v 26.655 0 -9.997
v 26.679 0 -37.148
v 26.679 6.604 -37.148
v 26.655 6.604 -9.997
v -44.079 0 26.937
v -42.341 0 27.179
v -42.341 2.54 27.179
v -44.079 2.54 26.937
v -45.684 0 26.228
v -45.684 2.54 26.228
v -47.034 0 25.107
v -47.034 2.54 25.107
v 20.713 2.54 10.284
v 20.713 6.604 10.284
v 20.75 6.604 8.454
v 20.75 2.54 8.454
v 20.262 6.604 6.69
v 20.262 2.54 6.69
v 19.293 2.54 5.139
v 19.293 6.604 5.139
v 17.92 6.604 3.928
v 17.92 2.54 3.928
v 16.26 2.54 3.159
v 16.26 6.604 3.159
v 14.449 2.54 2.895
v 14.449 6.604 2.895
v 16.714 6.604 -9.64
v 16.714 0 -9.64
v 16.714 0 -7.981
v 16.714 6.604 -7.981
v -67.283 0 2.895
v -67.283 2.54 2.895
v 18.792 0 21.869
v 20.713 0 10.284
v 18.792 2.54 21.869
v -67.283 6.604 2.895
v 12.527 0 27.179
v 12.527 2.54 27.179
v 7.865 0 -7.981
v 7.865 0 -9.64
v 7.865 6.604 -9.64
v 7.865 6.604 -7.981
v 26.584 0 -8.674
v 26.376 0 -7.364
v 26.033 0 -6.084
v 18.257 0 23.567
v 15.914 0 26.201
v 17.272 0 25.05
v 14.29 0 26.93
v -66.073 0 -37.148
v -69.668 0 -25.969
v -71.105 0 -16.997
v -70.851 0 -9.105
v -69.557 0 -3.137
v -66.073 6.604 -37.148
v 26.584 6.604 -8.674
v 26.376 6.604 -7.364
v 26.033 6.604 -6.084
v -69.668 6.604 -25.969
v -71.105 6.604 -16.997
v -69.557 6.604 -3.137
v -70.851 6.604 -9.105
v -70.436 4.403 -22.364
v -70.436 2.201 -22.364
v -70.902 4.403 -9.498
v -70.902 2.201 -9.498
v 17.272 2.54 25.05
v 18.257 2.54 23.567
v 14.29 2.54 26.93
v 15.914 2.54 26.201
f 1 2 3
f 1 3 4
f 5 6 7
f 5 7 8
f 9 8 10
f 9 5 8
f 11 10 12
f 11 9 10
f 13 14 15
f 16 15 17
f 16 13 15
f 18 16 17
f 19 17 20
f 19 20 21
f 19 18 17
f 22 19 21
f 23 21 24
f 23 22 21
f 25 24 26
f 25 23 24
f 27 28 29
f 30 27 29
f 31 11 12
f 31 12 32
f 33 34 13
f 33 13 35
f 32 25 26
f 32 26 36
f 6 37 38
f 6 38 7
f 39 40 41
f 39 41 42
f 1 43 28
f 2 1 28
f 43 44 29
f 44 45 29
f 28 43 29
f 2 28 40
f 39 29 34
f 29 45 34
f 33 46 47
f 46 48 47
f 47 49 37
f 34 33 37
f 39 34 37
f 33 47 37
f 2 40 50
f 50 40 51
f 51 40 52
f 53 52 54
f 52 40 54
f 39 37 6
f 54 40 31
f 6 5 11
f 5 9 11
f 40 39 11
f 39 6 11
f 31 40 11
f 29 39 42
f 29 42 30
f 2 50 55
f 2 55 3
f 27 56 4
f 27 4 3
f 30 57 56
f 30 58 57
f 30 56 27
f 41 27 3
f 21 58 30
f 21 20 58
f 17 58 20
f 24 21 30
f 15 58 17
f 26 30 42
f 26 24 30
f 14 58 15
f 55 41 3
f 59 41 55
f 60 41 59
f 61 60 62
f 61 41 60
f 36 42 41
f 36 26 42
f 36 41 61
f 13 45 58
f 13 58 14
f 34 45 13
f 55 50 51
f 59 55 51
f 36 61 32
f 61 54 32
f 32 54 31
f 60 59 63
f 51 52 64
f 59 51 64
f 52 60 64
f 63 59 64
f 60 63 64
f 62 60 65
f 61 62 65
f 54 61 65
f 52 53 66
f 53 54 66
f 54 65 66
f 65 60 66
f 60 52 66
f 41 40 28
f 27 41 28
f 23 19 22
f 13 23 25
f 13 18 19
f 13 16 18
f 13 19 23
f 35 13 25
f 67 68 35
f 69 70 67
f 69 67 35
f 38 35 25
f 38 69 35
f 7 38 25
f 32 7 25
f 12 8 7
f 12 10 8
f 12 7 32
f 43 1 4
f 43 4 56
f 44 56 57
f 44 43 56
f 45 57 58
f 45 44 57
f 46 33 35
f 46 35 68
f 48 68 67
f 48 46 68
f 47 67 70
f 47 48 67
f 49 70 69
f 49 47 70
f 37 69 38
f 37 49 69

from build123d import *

# Parameters (mm, degrees)
F0_W     = 8.849032
F0_H     = 1.659194
F1_DEPTH = 6.604
F2_DEPTH = 2.54


with BuildPart() as f1:
    # F0 (on Front) → F1 (new body)
    with BuildSketch(Plane.XZ):
        with BuildLine():
            add(Edge.make_bspline(
                [(-66.073255, -37.148017), (-72.320135, -20.923742), (-73.008267, -9.742427), (-67.282905, 2.894996)],
                knots=[0, 0, 0, 0, 40.06128, 40.06128, 40.06128, 40.06128], degree=3))
            Line((-66.073255, -37.148017), (26.679299, -37.148017))
            Line((26.679299, -37.148017), (26.654679, -9.997438))
            ThreePointArc((26.654679, -9.997438), (26.497353, -8.016108), (26.032825, -6.083588))
            Line((26.032825, -6.083588), (20.713379, 10.284061))
            ThreePointArc((20.713379, 10.284061), (19.292549, 5.138633), (14.448968, 2.894996))
            Line((14.448968, 2.894996), (-67.282905, 2.894996))
        make_face()
        with Locations((12.289253, -8.810178)):
            Rectangle(F0_W, F0_H, mode=Mode.SUBTRACT)
    extrude(amount=-F1_DEPTH)

    # F0 (on Front) → F2 (join)
    with BuildSketch(Plane.XZ):
        with BuildLine():
            add(Edge.make_bspline(
                [(-66.073255, -37.148017), (-72.320135, -20.923742), (-73.008267, -9.742427), (-67.282905, 2.894996)],
                knots=[0, 0, 0, 0, 40.06128, 40.06128, 40.06128, 40.06128], degree=3))
            Line((-66.073255, -37.148017), (26.679299, -37.148017))
            Line((26.679299, -37.148017), (26.654679, -9.997438))
            ThreePointArc((26.654679, -9.997438), (26.497353, -8.016108), (26.032825, -6.083588))
            Line((26.032825, -6.083588), (20.713379, 10.284061))
            ThreePointArc((20.713379, 10.284061), (19.292549, 5.138633), (14.448968, 2.894996))
            Line((14.448968, 2.894996), (-67.282905, 2.894996))
        make_face()
        with Locations((12.289253, -8.810178)):
            Rectangle(F0_W, F0_H, mode=Mode.SUBTRACT)
        with BuildLine():
            Line((-47.033889, 25.107424), (-67.282905, 2.894996))
            Line((-67.282905, 2.894996), (14.448968, 2.894996))
            ThreePointArc((14.448968, 2.894996), (19.292549, 5.138633), (20.713379, 10.284061))
            Line((20.713379, 10.284061), (18.791883, 21.868555))
            ThreePointArc((18.791883, 21.868555), (16.633835, 25.673071), (12.527472, 27.17949))
            Line((12.527472, 27.17949), (-42.341152, 27.17949))
            ThreePointArc((-42.341152, 27.17949), (-44.906071, 26.638422), (-47.033889, 25.107424))
        make_face()
    extrude(amount=-F2_DEPTH)


solid = f1.part
